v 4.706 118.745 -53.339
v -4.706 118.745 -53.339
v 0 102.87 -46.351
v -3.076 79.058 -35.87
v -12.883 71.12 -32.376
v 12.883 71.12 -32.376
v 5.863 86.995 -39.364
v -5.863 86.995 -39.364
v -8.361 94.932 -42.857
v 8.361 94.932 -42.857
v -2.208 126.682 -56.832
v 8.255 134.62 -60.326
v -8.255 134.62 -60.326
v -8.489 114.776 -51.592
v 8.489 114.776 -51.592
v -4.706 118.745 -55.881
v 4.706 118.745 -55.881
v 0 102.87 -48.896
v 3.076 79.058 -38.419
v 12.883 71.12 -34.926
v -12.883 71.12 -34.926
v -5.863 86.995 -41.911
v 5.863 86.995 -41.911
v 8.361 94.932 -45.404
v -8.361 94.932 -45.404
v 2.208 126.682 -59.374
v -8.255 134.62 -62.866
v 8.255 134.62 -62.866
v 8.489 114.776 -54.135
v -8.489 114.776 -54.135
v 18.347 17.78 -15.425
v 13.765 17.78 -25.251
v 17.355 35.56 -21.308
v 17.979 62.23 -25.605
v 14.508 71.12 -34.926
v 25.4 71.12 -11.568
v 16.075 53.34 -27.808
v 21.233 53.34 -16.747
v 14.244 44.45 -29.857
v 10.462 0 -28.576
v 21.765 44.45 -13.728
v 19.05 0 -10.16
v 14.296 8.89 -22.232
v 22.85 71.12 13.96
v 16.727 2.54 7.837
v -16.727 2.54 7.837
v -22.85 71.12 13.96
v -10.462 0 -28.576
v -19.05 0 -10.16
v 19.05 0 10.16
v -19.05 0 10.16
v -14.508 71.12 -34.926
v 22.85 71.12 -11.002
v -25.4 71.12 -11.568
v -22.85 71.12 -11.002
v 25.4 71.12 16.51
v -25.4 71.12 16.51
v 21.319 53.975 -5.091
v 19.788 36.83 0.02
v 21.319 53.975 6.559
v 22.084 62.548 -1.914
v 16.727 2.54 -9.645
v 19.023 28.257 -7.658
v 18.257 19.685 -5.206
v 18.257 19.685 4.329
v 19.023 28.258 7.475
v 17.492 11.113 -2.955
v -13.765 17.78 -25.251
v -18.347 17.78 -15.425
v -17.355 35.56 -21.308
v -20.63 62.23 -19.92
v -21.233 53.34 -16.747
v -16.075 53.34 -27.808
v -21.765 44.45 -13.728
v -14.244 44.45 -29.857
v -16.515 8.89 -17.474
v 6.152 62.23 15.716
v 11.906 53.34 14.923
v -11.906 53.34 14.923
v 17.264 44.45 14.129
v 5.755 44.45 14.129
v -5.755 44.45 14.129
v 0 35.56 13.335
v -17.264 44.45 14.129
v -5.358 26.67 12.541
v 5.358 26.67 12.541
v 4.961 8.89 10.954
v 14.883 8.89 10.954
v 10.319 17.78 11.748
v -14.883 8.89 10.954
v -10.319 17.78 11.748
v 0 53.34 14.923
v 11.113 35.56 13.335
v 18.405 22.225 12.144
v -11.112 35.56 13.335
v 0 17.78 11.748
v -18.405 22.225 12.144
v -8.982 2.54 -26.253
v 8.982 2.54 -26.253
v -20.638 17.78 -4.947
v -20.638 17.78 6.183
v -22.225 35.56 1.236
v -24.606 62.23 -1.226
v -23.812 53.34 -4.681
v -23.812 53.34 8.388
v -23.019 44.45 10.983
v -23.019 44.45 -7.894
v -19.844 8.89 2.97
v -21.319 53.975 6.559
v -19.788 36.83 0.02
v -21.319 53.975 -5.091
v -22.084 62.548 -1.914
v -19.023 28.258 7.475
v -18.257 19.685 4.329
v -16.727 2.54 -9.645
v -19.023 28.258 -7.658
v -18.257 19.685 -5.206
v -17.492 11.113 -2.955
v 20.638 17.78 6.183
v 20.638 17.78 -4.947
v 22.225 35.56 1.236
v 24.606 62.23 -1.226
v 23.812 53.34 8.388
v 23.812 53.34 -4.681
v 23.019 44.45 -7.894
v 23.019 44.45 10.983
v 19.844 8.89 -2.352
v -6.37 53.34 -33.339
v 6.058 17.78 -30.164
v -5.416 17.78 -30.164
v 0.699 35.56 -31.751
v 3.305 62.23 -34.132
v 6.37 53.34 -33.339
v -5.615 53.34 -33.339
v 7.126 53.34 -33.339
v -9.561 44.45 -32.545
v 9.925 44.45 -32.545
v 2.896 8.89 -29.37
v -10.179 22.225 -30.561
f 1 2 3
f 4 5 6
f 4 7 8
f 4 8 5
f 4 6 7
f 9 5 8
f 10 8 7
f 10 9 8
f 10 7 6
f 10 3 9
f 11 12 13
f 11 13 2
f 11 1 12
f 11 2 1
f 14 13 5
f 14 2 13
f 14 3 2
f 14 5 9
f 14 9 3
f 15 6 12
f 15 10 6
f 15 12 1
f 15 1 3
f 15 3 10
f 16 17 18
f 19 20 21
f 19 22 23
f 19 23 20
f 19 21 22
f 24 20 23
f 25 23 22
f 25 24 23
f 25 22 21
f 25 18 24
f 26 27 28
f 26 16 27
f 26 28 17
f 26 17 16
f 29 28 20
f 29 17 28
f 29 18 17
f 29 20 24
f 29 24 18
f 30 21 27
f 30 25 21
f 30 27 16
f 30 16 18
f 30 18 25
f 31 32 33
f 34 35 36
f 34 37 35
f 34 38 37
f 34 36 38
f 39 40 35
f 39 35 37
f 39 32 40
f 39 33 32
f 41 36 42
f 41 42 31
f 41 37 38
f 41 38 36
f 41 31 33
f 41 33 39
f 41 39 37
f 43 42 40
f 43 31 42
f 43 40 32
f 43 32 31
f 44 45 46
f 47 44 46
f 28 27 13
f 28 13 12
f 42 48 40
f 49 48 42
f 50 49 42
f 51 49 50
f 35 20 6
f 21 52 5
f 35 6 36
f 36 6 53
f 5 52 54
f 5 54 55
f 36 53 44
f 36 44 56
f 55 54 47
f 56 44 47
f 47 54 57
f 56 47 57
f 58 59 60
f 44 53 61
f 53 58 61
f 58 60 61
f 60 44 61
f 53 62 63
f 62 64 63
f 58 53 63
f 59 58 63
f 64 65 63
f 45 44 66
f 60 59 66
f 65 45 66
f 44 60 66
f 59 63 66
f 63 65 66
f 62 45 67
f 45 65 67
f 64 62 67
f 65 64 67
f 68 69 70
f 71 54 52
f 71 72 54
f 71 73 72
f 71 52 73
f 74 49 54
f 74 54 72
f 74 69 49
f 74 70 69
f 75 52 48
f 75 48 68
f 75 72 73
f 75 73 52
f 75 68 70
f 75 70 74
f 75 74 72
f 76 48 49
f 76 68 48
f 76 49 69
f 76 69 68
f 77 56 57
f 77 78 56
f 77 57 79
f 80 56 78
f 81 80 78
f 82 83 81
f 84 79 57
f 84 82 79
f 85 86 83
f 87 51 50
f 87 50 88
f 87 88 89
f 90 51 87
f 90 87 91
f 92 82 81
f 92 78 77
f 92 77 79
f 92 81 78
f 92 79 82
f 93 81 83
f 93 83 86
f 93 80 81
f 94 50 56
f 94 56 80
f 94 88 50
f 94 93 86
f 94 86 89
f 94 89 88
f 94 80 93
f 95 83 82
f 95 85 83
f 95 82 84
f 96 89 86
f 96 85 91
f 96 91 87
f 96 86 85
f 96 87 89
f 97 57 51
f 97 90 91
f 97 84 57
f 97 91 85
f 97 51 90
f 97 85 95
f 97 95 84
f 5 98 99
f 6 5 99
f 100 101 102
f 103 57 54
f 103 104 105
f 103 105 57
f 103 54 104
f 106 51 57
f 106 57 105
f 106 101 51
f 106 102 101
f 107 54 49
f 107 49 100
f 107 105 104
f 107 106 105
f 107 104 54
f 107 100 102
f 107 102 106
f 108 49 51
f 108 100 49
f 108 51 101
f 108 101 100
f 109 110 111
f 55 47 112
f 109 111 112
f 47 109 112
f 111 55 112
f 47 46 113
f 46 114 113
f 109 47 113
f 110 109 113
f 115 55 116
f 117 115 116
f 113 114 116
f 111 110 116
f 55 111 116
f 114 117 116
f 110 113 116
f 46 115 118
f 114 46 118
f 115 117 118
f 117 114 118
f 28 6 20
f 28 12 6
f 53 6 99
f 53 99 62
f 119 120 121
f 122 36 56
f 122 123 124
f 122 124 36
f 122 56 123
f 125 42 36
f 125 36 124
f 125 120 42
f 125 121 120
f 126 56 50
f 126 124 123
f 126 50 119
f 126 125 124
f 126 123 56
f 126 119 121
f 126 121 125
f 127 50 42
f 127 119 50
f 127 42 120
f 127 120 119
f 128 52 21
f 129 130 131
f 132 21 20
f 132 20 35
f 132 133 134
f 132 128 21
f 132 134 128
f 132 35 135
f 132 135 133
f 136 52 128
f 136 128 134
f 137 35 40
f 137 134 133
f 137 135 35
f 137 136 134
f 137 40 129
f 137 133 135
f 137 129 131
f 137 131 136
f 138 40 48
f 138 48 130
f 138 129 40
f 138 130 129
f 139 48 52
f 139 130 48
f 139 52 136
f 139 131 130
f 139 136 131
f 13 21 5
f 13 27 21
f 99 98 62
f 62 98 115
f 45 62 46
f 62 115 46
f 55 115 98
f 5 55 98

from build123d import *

# Parameters (mm, degrees)
SHELL1_T  = -2.54
SKETCH8_W = 25.766394978
SKETCH8_H = 2.550104265
SKETCH6_W = 16.51
SKETCH6_H = 2.54


with BuildPart() as part:
    # Sketch3 → Loft2 section 0
    with BuildSketch(Plane(origin=(0, 71.12, 0), x_dir=(1, 0, 0), z_dir=(0, 1, 0))):
        Polygon((-14.507793078, 34.926174233), (14.507793078, 34.926174233), (25.4, 11.567761108), (25.4, -16.51), (-25.4, -16.51), (-25.4, 11.567761108), align=None)
    # Sketch1 → Loft2 section 1
    with BuildSketch(Plane(origin=(0, 0, 0), x_dir=(1, 0, 0), z_dir=(0, 1, 0))):
        Polygon((-10.462396921, 28.576174233), (10.462396921, 28.576174233), (19.05, 10.16), (19.05, -10.16), (-19.05, -10.16), (-19.05, 10.16), align=None)
    loft()

    # Shell1
    shell1_openings = [part.faces().sort_by_distance(p)[0] for p in [
        (0, 71.12, -9.994645113),
    ]]
    offset(amount=SHELL1_T, openings=shell1_openings, kind=Kind.INTERSECTION)

    # Sketch8 → Loft3 section 0
    with BuildSketch(Plane(origin=(0, 71.12, 0), x_dir=(1, 0, 0), z_dir=(0, 1, 0))):
        with Locations((0, 33.651122101)):
            Rectangle(SKETCH8_W, SKETCH8_H)
    # Sketch6 → Loft3 section 1
    with BuildSketch(Plane(origin=(0, 134.62, 0), x_dir=(1, 0, 0), z_dir=(0, 1, 0))):
        with Locations((0, 61.596174233)):
            Rectangle(SKETCH6_W, SKETCH6_H)
    loft()


solid = part.part
